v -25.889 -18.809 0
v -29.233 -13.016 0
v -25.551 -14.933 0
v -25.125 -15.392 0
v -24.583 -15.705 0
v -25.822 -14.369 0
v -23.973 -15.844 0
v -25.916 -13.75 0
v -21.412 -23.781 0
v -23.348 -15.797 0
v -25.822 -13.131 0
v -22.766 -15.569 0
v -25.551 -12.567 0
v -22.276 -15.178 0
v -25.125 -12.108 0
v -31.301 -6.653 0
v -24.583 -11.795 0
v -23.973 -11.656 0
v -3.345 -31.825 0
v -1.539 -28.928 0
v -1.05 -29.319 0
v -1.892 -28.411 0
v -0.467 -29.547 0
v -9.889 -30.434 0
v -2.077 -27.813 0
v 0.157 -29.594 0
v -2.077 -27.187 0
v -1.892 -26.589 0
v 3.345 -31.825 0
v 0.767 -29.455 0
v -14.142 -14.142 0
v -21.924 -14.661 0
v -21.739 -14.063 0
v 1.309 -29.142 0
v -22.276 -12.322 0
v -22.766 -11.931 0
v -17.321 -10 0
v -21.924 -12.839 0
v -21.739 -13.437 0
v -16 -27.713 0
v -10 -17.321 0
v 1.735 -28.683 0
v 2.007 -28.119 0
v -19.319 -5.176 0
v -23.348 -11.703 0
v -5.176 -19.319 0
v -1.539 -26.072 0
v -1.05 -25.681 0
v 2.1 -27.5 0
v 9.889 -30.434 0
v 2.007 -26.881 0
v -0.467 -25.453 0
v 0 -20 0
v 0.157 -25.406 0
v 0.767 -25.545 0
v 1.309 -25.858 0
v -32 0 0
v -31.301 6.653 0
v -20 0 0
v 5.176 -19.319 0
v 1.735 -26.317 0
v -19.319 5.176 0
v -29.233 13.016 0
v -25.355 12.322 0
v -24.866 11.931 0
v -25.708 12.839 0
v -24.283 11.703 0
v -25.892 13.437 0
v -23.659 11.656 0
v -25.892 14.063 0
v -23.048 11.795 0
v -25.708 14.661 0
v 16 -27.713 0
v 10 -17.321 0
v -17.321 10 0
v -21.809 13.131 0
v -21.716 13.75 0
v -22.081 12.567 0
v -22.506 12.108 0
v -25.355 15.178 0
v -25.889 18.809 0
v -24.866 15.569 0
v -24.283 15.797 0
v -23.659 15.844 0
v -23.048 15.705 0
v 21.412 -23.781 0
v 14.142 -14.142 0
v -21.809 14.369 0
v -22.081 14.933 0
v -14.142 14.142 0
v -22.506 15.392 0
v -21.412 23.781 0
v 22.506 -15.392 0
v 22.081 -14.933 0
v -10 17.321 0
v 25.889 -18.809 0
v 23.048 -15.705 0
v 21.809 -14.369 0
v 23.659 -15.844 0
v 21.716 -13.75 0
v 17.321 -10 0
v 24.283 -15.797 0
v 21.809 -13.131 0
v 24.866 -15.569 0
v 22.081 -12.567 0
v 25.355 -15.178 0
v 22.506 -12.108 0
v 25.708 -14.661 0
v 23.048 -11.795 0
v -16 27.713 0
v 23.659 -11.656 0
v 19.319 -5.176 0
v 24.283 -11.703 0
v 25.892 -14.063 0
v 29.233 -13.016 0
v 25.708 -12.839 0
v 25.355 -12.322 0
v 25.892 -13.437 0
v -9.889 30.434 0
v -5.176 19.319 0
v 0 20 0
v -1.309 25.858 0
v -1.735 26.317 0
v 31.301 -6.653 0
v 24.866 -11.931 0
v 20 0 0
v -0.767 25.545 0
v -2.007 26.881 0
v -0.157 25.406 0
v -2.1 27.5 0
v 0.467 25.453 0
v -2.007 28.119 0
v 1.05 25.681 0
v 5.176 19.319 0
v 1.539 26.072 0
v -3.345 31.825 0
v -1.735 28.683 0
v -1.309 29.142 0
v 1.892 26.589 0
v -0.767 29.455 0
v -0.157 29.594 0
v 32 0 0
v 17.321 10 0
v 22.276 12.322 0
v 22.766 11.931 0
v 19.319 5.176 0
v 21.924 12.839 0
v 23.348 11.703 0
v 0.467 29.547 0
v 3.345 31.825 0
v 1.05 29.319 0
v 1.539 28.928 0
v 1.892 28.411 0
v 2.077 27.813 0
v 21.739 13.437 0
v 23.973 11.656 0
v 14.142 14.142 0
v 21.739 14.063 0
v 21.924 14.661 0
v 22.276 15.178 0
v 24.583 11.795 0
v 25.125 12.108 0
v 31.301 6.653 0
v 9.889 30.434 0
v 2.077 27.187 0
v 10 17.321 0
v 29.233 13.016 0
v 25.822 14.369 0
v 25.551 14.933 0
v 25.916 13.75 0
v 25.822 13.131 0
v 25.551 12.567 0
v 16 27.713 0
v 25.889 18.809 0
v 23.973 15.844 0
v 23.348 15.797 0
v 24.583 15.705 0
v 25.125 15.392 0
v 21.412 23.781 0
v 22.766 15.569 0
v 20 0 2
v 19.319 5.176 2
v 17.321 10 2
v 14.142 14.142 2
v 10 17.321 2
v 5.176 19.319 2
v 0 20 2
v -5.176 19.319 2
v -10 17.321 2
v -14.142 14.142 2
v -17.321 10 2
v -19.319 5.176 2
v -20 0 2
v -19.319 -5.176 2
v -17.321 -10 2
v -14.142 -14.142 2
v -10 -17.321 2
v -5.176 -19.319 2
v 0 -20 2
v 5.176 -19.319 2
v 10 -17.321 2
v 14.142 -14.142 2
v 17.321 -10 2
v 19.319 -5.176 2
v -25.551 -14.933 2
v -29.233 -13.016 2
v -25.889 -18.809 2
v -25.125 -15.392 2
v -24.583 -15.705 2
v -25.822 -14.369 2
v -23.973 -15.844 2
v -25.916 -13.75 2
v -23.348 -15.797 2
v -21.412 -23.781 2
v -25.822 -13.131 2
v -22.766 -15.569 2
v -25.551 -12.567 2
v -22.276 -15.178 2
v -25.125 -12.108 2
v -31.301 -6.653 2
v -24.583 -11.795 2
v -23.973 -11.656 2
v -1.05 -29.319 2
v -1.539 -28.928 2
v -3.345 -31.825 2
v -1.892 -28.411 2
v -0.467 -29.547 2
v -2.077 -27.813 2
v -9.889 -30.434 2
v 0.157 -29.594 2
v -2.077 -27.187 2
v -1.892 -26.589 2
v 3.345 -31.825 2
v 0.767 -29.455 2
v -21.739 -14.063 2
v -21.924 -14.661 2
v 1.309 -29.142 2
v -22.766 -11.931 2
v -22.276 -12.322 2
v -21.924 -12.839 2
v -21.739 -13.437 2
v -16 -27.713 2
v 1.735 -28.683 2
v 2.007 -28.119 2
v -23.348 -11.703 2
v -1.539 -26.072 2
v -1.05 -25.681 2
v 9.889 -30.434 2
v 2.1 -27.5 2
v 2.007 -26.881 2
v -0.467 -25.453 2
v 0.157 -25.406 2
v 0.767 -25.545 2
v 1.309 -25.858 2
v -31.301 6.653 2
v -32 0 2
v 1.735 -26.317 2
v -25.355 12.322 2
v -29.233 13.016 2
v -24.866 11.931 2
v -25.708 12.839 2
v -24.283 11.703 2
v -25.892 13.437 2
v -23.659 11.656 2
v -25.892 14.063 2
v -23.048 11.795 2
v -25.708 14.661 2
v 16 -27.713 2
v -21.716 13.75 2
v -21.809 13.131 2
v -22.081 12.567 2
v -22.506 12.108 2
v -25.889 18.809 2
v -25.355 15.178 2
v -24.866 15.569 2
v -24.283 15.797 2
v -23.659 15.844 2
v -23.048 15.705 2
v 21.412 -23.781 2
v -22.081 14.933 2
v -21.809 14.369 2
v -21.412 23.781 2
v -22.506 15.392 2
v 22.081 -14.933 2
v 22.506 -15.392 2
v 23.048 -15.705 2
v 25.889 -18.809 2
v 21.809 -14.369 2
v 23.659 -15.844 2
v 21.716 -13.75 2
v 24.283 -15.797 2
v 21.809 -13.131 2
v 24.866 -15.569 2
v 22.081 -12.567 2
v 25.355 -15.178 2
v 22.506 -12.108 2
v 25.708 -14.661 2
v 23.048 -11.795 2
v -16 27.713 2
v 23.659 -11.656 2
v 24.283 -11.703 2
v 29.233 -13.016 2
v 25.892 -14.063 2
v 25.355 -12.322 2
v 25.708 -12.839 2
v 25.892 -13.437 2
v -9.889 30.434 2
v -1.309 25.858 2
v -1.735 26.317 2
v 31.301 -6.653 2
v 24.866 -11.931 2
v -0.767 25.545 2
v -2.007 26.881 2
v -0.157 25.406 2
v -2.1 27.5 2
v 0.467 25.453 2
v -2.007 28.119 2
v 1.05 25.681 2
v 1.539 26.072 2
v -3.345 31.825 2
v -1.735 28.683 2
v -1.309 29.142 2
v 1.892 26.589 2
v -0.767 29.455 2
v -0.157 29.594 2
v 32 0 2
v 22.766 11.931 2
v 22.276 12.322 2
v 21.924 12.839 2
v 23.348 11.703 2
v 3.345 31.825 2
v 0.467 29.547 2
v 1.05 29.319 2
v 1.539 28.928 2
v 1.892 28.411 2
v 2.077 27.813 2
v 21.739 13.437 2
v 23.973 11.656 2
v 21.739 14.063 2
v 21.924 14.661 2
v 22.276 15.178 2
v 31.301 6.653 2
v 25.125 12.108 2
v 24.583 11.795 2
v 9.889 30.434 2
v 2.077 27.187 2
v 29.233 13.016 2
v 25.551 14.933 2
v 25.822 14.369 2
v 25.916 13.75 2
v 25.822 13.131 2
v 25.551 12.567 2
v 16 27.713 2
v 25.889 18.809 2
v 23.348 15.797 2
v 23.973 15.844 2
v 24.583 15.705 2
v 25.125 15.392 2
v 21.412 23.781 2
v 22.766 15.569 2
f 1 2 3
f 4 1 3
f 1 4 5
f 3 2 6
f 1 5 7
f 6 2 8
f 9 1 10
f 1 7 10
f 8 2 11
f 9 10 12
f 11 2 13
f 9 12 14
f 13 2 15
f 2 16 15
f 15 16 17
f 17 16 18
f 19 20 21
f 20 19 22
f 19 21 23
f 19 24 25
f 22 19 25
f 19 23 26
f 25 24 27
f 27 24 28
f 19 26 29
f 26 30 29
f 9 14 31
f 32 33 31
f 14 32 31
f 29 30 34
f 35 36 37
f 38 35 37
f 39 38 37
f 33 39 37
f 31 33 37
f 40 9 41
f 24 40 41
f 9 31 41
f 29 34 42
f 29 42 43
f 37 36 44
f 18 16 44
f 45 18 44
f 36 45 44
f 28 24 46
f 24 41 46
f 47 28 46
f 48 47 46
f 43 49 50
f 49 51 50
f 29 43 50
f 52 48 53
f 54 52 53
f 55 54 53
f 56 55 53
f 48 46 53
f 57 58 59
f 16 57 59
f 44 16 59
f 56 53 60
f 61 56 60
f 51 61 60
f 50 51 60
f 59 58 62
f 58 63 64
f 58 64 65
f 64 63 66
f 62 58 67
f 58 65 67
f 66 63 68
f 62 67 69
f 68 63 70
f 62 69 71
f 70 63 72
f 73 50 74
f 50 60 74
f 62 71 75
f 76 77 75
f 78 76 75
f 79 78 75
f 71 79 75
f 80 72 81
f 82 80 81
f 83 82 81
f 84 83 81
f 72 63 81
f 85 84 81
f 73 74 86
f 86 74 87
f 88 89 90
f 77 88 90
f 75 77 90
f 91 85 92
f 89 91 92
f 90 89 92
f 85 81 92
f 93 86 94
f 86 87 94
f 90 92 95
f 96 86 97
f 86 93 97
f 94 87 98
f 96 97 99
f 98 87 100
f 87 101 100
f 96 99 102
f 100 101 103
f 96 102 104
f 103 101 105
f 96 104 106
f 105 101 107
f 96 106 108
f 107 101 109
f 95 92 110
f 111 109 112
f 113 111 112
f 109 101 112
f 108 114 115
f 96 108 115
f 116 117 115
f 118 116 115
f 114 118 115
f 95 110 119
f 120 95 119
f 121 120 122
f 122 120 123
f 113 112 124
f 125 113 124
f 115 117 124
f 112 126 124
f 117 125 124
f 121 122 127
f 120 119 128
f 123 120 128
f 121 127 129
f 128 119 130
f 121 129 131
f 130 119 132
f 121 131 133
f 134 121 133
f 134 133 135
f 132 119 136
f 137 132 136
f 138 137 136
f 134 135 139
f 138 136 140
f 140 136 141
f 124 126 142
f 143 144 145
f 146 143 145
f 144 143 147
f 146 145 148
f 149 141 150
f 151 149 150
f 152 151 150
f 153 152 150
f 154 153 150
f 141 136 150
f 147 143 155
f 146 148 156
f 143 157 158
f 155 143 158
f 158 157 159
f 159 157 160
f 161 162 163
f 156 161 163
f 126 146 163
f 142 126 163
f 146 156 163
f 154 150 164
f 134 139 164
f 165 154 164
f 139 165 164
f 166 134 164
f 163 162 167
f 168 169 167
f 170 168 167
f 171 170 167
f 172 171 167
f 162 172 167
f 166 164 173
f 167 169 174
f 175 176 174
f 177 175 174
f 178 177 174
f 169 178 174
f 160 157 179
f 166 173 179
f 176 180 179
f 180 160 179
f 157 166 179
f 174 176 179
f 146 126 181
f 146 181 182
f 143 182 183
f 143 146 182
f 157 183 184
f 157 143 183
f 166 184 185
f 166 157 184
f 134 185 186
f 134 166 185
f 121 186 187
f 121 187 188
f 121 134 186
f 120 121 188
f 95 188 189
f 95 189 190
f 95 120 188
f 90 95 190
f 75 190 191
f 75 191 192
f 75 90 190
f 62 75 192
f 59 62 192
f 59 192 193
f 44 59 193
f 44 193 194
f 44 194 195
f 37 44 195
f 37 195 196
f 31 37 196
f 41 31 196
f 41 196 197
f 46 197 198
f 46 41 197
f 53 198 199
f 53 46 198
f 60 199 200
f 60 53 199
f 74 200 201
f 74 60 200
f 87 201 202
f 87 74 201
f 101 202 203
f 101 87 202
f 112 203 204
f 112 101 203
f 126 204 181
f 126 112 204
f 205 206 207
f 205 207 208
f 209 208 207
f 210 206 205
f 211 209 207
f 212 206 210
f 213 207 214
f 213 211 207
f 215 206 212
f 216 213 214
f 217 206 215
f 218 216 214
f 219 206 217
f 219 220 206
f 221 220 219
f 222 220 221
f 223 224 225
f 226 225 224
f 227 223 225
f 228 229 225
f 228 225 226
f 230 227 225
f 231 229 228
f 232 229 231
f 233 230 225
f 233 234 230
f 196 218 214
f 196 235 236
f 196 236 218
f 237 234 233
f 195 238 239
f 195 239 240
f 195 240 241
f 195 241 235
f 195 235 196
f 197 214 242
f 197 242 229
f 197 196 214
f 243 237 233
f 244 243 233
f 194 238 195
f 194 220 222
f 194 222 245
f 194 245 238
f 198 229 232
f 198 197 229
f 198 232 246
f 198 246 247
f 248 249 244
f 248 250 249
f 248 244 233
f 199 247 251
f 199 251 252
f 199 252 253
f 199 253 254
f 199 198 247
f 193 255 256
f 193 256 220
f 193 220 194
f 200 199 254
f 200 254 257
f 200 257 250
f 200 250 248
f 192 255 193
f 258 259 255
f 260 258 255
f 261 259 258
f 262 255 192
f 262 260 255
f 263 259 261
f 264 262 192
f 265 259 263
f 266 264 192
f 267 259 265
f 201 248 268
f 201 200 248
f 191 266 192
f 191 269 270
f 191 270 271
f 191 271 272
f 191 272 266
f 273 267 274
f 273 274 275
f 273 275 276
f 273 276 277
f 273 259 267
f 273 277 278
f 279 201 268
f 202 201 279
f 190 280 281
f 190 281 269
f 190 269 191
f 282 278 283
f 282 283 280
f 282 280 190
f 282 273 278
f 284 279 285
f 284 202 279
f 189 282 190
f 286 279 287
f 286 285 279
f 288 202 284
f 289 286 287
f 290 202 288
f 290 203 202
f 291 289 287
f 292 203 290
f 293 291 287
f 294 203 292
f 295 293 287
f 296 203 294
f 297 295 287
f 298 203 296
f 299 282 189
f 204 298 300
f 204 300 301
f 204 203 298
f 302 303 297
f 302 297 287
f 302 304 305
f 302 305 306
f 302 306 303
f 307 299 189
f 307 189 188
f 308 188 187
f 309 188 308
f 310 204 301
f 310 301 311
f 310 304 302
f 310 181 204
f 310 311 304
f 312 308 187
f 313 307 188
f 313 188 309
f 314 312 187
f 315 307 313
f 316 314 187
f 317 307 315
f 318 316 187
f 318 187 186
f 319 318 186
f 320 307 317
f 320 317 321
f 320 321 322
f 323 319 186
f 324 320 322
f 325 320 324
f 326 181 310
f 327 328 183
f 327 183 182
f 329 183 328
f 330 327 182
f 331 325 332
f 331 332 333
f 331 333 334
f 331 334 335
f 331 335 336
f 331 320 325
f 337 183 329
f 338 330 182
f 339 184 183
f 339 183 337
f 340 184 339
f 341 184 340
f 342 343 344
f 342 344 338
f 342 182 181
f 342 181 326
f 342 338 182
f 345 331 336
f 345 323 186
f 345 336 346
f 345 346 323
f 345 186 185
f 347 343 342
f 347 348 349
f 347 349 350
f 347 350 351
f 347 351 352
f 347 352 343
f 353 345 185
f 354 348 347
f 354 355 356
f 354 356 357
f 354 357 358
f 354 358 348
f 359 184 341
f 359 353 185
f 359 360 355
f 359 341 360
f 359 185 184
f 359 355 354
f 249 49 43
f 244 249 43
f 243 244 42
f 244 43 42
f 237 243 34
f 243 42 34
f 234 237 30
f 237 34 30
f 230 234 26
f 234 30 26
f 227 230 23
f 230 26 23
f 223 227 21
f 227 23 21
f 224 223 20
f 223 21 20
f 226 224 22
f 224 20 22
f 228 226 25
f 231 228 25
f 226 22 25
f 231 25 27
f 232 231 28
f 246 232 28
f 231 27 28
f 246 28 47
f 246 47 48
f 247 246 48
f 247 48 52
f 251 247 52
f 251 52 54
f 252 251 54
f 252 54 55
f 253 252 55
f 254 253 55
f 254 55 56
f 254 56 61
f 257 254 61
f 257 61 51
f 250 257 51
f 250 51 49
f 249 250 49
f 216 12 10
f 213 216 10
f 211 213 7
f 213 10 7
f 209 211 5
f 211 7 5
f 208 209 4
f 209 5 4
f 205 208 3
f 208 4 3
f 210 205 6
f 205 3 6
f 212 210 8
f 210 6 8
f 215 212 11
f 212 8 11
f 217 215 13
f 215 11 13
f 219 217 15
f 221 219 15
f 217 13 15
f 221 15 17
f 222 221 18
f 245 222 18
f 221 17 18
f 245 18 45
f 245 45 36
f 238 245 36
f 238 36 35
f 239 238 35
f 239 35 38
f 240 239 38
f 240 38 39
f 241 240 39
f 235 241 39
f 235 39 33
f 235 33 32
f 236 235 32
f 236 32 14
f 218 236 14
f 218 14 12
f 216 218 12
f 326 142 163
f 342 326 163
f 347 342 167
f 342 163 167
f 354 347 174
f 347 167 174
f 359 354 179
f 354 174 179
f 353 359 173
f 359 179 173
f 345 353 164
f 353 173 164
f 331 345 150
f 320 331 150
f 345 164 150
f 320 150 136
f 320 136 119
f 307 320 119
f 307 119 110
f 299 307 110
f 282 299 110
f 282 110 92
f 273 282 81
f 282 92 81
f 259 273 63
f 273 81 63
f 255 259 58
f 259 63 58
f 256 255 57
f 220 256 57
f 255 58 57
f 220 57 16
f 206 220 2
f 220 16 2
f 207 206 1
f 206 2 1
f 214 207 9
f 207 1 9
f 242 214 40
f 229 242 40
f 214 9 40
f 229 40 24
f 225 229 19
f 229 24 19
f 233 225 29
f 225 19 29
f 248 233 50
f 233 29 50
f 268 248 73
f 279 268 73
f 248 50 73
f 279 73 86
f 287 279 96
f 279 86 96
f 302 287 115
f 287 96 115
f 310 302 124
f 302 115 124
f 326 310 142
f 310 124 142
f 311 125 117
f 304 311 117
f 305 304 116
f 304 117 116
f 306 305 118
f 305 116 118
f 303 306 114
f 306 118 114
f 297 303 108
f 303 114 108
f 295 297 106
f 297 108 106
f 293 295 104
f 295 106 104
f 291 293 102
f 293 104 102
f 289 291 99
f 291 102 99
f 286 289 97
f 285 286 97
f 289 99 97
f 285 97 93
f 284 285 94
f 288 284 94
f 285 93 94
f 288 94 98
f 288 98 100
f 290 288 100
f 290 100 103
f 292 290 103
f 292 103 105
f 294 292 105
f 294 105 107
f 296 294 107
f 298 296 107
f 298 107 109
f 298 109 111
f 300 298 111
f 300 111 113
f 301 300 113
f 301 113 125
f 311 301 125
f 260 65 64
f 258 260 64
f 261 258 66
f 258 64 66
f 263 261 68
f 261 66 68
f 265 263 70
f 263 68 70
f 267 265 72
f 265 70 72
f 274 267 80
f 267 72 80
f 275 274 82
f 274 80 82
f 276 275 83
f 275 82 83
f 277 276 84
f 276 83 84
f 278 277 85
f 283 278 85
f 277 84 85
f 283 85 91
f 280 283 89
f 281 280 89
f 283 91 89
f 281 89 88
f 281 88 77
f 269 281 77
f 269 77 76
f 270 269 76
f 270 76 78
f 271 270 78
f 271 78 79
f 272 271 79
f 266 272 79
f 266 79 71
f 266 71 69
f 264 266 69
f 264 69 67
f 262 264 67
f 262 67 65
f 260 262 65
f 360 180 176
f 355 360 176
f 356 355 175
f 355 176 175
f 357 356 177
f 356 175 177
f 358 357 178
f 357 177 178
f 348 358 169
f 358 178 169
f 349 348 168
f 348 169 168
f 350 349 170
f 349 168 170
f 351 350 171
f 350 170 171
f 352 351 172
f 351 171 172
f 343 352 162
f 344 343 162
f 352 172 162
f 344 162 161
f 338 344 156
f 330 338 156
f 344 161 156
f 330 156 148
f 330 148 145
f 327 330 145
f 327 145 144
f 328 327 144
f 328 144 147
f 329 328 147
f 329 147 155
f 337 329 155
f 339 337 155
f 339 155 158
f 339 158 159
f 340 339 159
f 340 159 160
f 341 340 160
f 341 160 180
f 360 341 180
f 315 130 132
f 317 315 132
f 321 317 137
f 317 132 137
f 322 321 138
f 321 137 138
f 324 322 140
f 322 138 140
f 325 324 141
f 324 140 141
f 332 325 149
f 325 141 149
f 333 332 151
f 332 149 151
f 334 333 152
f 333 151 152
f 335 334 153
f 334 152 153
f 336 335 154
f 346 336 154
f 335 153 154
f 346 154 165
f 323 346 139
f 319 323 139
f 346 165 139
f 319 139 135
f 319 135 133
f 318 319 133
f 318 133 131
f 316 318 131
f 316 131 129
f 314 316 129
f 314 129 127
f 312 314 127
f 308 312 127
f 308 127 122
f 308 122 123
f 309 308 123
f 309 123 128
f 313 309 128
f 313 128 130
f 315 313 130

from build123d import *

# Parameters (mm, degrees)
SKETCH_1_R               = 32
SKETCH_1_R_2             = 20
EXTRUDE_1_DEPTH          = 2
HOLE_WIZARD_M41_D        = 4.2
PATTERN_CIRCULAR_1_COUNT = 6


with BuildPart() as part:
    # Эскиз1 → Бобышка-Вытянуть1 (new body)
    with BuildSketch(Plane.XY):
        Circle(SKETCH_1_R)
        Circle(SKETCH_1_R_2, mode=Mode.SUBTRACT)
    extrude(amount=EXTRUDE_1_DEPTH)

    # Сверло под метчик  спиральное M41 (through all)
    with Locations(Plane.XY.offset(2)):
        with Locations((0, 27.5)):
            hole_wizard_m41 = Hole(HOLE_WIZARD_M41_D / 2)

    # Круговой массив1: Сверло под метчик  спиральное M41 ×6 about axis
    pattern_circular_1_axis = Axis((0, 0, 0), (0, 0, 1))
    for i in range(1, PATTERN_CIRCULAR_1_COUNT):
        add(hole_wizard_m41.rotate(pattern_circular_1_axis, i * 360 / PATTERN_CIRCULAR_1_COUNT), mode=Mode.SUBTRACT)


solid = part.part
